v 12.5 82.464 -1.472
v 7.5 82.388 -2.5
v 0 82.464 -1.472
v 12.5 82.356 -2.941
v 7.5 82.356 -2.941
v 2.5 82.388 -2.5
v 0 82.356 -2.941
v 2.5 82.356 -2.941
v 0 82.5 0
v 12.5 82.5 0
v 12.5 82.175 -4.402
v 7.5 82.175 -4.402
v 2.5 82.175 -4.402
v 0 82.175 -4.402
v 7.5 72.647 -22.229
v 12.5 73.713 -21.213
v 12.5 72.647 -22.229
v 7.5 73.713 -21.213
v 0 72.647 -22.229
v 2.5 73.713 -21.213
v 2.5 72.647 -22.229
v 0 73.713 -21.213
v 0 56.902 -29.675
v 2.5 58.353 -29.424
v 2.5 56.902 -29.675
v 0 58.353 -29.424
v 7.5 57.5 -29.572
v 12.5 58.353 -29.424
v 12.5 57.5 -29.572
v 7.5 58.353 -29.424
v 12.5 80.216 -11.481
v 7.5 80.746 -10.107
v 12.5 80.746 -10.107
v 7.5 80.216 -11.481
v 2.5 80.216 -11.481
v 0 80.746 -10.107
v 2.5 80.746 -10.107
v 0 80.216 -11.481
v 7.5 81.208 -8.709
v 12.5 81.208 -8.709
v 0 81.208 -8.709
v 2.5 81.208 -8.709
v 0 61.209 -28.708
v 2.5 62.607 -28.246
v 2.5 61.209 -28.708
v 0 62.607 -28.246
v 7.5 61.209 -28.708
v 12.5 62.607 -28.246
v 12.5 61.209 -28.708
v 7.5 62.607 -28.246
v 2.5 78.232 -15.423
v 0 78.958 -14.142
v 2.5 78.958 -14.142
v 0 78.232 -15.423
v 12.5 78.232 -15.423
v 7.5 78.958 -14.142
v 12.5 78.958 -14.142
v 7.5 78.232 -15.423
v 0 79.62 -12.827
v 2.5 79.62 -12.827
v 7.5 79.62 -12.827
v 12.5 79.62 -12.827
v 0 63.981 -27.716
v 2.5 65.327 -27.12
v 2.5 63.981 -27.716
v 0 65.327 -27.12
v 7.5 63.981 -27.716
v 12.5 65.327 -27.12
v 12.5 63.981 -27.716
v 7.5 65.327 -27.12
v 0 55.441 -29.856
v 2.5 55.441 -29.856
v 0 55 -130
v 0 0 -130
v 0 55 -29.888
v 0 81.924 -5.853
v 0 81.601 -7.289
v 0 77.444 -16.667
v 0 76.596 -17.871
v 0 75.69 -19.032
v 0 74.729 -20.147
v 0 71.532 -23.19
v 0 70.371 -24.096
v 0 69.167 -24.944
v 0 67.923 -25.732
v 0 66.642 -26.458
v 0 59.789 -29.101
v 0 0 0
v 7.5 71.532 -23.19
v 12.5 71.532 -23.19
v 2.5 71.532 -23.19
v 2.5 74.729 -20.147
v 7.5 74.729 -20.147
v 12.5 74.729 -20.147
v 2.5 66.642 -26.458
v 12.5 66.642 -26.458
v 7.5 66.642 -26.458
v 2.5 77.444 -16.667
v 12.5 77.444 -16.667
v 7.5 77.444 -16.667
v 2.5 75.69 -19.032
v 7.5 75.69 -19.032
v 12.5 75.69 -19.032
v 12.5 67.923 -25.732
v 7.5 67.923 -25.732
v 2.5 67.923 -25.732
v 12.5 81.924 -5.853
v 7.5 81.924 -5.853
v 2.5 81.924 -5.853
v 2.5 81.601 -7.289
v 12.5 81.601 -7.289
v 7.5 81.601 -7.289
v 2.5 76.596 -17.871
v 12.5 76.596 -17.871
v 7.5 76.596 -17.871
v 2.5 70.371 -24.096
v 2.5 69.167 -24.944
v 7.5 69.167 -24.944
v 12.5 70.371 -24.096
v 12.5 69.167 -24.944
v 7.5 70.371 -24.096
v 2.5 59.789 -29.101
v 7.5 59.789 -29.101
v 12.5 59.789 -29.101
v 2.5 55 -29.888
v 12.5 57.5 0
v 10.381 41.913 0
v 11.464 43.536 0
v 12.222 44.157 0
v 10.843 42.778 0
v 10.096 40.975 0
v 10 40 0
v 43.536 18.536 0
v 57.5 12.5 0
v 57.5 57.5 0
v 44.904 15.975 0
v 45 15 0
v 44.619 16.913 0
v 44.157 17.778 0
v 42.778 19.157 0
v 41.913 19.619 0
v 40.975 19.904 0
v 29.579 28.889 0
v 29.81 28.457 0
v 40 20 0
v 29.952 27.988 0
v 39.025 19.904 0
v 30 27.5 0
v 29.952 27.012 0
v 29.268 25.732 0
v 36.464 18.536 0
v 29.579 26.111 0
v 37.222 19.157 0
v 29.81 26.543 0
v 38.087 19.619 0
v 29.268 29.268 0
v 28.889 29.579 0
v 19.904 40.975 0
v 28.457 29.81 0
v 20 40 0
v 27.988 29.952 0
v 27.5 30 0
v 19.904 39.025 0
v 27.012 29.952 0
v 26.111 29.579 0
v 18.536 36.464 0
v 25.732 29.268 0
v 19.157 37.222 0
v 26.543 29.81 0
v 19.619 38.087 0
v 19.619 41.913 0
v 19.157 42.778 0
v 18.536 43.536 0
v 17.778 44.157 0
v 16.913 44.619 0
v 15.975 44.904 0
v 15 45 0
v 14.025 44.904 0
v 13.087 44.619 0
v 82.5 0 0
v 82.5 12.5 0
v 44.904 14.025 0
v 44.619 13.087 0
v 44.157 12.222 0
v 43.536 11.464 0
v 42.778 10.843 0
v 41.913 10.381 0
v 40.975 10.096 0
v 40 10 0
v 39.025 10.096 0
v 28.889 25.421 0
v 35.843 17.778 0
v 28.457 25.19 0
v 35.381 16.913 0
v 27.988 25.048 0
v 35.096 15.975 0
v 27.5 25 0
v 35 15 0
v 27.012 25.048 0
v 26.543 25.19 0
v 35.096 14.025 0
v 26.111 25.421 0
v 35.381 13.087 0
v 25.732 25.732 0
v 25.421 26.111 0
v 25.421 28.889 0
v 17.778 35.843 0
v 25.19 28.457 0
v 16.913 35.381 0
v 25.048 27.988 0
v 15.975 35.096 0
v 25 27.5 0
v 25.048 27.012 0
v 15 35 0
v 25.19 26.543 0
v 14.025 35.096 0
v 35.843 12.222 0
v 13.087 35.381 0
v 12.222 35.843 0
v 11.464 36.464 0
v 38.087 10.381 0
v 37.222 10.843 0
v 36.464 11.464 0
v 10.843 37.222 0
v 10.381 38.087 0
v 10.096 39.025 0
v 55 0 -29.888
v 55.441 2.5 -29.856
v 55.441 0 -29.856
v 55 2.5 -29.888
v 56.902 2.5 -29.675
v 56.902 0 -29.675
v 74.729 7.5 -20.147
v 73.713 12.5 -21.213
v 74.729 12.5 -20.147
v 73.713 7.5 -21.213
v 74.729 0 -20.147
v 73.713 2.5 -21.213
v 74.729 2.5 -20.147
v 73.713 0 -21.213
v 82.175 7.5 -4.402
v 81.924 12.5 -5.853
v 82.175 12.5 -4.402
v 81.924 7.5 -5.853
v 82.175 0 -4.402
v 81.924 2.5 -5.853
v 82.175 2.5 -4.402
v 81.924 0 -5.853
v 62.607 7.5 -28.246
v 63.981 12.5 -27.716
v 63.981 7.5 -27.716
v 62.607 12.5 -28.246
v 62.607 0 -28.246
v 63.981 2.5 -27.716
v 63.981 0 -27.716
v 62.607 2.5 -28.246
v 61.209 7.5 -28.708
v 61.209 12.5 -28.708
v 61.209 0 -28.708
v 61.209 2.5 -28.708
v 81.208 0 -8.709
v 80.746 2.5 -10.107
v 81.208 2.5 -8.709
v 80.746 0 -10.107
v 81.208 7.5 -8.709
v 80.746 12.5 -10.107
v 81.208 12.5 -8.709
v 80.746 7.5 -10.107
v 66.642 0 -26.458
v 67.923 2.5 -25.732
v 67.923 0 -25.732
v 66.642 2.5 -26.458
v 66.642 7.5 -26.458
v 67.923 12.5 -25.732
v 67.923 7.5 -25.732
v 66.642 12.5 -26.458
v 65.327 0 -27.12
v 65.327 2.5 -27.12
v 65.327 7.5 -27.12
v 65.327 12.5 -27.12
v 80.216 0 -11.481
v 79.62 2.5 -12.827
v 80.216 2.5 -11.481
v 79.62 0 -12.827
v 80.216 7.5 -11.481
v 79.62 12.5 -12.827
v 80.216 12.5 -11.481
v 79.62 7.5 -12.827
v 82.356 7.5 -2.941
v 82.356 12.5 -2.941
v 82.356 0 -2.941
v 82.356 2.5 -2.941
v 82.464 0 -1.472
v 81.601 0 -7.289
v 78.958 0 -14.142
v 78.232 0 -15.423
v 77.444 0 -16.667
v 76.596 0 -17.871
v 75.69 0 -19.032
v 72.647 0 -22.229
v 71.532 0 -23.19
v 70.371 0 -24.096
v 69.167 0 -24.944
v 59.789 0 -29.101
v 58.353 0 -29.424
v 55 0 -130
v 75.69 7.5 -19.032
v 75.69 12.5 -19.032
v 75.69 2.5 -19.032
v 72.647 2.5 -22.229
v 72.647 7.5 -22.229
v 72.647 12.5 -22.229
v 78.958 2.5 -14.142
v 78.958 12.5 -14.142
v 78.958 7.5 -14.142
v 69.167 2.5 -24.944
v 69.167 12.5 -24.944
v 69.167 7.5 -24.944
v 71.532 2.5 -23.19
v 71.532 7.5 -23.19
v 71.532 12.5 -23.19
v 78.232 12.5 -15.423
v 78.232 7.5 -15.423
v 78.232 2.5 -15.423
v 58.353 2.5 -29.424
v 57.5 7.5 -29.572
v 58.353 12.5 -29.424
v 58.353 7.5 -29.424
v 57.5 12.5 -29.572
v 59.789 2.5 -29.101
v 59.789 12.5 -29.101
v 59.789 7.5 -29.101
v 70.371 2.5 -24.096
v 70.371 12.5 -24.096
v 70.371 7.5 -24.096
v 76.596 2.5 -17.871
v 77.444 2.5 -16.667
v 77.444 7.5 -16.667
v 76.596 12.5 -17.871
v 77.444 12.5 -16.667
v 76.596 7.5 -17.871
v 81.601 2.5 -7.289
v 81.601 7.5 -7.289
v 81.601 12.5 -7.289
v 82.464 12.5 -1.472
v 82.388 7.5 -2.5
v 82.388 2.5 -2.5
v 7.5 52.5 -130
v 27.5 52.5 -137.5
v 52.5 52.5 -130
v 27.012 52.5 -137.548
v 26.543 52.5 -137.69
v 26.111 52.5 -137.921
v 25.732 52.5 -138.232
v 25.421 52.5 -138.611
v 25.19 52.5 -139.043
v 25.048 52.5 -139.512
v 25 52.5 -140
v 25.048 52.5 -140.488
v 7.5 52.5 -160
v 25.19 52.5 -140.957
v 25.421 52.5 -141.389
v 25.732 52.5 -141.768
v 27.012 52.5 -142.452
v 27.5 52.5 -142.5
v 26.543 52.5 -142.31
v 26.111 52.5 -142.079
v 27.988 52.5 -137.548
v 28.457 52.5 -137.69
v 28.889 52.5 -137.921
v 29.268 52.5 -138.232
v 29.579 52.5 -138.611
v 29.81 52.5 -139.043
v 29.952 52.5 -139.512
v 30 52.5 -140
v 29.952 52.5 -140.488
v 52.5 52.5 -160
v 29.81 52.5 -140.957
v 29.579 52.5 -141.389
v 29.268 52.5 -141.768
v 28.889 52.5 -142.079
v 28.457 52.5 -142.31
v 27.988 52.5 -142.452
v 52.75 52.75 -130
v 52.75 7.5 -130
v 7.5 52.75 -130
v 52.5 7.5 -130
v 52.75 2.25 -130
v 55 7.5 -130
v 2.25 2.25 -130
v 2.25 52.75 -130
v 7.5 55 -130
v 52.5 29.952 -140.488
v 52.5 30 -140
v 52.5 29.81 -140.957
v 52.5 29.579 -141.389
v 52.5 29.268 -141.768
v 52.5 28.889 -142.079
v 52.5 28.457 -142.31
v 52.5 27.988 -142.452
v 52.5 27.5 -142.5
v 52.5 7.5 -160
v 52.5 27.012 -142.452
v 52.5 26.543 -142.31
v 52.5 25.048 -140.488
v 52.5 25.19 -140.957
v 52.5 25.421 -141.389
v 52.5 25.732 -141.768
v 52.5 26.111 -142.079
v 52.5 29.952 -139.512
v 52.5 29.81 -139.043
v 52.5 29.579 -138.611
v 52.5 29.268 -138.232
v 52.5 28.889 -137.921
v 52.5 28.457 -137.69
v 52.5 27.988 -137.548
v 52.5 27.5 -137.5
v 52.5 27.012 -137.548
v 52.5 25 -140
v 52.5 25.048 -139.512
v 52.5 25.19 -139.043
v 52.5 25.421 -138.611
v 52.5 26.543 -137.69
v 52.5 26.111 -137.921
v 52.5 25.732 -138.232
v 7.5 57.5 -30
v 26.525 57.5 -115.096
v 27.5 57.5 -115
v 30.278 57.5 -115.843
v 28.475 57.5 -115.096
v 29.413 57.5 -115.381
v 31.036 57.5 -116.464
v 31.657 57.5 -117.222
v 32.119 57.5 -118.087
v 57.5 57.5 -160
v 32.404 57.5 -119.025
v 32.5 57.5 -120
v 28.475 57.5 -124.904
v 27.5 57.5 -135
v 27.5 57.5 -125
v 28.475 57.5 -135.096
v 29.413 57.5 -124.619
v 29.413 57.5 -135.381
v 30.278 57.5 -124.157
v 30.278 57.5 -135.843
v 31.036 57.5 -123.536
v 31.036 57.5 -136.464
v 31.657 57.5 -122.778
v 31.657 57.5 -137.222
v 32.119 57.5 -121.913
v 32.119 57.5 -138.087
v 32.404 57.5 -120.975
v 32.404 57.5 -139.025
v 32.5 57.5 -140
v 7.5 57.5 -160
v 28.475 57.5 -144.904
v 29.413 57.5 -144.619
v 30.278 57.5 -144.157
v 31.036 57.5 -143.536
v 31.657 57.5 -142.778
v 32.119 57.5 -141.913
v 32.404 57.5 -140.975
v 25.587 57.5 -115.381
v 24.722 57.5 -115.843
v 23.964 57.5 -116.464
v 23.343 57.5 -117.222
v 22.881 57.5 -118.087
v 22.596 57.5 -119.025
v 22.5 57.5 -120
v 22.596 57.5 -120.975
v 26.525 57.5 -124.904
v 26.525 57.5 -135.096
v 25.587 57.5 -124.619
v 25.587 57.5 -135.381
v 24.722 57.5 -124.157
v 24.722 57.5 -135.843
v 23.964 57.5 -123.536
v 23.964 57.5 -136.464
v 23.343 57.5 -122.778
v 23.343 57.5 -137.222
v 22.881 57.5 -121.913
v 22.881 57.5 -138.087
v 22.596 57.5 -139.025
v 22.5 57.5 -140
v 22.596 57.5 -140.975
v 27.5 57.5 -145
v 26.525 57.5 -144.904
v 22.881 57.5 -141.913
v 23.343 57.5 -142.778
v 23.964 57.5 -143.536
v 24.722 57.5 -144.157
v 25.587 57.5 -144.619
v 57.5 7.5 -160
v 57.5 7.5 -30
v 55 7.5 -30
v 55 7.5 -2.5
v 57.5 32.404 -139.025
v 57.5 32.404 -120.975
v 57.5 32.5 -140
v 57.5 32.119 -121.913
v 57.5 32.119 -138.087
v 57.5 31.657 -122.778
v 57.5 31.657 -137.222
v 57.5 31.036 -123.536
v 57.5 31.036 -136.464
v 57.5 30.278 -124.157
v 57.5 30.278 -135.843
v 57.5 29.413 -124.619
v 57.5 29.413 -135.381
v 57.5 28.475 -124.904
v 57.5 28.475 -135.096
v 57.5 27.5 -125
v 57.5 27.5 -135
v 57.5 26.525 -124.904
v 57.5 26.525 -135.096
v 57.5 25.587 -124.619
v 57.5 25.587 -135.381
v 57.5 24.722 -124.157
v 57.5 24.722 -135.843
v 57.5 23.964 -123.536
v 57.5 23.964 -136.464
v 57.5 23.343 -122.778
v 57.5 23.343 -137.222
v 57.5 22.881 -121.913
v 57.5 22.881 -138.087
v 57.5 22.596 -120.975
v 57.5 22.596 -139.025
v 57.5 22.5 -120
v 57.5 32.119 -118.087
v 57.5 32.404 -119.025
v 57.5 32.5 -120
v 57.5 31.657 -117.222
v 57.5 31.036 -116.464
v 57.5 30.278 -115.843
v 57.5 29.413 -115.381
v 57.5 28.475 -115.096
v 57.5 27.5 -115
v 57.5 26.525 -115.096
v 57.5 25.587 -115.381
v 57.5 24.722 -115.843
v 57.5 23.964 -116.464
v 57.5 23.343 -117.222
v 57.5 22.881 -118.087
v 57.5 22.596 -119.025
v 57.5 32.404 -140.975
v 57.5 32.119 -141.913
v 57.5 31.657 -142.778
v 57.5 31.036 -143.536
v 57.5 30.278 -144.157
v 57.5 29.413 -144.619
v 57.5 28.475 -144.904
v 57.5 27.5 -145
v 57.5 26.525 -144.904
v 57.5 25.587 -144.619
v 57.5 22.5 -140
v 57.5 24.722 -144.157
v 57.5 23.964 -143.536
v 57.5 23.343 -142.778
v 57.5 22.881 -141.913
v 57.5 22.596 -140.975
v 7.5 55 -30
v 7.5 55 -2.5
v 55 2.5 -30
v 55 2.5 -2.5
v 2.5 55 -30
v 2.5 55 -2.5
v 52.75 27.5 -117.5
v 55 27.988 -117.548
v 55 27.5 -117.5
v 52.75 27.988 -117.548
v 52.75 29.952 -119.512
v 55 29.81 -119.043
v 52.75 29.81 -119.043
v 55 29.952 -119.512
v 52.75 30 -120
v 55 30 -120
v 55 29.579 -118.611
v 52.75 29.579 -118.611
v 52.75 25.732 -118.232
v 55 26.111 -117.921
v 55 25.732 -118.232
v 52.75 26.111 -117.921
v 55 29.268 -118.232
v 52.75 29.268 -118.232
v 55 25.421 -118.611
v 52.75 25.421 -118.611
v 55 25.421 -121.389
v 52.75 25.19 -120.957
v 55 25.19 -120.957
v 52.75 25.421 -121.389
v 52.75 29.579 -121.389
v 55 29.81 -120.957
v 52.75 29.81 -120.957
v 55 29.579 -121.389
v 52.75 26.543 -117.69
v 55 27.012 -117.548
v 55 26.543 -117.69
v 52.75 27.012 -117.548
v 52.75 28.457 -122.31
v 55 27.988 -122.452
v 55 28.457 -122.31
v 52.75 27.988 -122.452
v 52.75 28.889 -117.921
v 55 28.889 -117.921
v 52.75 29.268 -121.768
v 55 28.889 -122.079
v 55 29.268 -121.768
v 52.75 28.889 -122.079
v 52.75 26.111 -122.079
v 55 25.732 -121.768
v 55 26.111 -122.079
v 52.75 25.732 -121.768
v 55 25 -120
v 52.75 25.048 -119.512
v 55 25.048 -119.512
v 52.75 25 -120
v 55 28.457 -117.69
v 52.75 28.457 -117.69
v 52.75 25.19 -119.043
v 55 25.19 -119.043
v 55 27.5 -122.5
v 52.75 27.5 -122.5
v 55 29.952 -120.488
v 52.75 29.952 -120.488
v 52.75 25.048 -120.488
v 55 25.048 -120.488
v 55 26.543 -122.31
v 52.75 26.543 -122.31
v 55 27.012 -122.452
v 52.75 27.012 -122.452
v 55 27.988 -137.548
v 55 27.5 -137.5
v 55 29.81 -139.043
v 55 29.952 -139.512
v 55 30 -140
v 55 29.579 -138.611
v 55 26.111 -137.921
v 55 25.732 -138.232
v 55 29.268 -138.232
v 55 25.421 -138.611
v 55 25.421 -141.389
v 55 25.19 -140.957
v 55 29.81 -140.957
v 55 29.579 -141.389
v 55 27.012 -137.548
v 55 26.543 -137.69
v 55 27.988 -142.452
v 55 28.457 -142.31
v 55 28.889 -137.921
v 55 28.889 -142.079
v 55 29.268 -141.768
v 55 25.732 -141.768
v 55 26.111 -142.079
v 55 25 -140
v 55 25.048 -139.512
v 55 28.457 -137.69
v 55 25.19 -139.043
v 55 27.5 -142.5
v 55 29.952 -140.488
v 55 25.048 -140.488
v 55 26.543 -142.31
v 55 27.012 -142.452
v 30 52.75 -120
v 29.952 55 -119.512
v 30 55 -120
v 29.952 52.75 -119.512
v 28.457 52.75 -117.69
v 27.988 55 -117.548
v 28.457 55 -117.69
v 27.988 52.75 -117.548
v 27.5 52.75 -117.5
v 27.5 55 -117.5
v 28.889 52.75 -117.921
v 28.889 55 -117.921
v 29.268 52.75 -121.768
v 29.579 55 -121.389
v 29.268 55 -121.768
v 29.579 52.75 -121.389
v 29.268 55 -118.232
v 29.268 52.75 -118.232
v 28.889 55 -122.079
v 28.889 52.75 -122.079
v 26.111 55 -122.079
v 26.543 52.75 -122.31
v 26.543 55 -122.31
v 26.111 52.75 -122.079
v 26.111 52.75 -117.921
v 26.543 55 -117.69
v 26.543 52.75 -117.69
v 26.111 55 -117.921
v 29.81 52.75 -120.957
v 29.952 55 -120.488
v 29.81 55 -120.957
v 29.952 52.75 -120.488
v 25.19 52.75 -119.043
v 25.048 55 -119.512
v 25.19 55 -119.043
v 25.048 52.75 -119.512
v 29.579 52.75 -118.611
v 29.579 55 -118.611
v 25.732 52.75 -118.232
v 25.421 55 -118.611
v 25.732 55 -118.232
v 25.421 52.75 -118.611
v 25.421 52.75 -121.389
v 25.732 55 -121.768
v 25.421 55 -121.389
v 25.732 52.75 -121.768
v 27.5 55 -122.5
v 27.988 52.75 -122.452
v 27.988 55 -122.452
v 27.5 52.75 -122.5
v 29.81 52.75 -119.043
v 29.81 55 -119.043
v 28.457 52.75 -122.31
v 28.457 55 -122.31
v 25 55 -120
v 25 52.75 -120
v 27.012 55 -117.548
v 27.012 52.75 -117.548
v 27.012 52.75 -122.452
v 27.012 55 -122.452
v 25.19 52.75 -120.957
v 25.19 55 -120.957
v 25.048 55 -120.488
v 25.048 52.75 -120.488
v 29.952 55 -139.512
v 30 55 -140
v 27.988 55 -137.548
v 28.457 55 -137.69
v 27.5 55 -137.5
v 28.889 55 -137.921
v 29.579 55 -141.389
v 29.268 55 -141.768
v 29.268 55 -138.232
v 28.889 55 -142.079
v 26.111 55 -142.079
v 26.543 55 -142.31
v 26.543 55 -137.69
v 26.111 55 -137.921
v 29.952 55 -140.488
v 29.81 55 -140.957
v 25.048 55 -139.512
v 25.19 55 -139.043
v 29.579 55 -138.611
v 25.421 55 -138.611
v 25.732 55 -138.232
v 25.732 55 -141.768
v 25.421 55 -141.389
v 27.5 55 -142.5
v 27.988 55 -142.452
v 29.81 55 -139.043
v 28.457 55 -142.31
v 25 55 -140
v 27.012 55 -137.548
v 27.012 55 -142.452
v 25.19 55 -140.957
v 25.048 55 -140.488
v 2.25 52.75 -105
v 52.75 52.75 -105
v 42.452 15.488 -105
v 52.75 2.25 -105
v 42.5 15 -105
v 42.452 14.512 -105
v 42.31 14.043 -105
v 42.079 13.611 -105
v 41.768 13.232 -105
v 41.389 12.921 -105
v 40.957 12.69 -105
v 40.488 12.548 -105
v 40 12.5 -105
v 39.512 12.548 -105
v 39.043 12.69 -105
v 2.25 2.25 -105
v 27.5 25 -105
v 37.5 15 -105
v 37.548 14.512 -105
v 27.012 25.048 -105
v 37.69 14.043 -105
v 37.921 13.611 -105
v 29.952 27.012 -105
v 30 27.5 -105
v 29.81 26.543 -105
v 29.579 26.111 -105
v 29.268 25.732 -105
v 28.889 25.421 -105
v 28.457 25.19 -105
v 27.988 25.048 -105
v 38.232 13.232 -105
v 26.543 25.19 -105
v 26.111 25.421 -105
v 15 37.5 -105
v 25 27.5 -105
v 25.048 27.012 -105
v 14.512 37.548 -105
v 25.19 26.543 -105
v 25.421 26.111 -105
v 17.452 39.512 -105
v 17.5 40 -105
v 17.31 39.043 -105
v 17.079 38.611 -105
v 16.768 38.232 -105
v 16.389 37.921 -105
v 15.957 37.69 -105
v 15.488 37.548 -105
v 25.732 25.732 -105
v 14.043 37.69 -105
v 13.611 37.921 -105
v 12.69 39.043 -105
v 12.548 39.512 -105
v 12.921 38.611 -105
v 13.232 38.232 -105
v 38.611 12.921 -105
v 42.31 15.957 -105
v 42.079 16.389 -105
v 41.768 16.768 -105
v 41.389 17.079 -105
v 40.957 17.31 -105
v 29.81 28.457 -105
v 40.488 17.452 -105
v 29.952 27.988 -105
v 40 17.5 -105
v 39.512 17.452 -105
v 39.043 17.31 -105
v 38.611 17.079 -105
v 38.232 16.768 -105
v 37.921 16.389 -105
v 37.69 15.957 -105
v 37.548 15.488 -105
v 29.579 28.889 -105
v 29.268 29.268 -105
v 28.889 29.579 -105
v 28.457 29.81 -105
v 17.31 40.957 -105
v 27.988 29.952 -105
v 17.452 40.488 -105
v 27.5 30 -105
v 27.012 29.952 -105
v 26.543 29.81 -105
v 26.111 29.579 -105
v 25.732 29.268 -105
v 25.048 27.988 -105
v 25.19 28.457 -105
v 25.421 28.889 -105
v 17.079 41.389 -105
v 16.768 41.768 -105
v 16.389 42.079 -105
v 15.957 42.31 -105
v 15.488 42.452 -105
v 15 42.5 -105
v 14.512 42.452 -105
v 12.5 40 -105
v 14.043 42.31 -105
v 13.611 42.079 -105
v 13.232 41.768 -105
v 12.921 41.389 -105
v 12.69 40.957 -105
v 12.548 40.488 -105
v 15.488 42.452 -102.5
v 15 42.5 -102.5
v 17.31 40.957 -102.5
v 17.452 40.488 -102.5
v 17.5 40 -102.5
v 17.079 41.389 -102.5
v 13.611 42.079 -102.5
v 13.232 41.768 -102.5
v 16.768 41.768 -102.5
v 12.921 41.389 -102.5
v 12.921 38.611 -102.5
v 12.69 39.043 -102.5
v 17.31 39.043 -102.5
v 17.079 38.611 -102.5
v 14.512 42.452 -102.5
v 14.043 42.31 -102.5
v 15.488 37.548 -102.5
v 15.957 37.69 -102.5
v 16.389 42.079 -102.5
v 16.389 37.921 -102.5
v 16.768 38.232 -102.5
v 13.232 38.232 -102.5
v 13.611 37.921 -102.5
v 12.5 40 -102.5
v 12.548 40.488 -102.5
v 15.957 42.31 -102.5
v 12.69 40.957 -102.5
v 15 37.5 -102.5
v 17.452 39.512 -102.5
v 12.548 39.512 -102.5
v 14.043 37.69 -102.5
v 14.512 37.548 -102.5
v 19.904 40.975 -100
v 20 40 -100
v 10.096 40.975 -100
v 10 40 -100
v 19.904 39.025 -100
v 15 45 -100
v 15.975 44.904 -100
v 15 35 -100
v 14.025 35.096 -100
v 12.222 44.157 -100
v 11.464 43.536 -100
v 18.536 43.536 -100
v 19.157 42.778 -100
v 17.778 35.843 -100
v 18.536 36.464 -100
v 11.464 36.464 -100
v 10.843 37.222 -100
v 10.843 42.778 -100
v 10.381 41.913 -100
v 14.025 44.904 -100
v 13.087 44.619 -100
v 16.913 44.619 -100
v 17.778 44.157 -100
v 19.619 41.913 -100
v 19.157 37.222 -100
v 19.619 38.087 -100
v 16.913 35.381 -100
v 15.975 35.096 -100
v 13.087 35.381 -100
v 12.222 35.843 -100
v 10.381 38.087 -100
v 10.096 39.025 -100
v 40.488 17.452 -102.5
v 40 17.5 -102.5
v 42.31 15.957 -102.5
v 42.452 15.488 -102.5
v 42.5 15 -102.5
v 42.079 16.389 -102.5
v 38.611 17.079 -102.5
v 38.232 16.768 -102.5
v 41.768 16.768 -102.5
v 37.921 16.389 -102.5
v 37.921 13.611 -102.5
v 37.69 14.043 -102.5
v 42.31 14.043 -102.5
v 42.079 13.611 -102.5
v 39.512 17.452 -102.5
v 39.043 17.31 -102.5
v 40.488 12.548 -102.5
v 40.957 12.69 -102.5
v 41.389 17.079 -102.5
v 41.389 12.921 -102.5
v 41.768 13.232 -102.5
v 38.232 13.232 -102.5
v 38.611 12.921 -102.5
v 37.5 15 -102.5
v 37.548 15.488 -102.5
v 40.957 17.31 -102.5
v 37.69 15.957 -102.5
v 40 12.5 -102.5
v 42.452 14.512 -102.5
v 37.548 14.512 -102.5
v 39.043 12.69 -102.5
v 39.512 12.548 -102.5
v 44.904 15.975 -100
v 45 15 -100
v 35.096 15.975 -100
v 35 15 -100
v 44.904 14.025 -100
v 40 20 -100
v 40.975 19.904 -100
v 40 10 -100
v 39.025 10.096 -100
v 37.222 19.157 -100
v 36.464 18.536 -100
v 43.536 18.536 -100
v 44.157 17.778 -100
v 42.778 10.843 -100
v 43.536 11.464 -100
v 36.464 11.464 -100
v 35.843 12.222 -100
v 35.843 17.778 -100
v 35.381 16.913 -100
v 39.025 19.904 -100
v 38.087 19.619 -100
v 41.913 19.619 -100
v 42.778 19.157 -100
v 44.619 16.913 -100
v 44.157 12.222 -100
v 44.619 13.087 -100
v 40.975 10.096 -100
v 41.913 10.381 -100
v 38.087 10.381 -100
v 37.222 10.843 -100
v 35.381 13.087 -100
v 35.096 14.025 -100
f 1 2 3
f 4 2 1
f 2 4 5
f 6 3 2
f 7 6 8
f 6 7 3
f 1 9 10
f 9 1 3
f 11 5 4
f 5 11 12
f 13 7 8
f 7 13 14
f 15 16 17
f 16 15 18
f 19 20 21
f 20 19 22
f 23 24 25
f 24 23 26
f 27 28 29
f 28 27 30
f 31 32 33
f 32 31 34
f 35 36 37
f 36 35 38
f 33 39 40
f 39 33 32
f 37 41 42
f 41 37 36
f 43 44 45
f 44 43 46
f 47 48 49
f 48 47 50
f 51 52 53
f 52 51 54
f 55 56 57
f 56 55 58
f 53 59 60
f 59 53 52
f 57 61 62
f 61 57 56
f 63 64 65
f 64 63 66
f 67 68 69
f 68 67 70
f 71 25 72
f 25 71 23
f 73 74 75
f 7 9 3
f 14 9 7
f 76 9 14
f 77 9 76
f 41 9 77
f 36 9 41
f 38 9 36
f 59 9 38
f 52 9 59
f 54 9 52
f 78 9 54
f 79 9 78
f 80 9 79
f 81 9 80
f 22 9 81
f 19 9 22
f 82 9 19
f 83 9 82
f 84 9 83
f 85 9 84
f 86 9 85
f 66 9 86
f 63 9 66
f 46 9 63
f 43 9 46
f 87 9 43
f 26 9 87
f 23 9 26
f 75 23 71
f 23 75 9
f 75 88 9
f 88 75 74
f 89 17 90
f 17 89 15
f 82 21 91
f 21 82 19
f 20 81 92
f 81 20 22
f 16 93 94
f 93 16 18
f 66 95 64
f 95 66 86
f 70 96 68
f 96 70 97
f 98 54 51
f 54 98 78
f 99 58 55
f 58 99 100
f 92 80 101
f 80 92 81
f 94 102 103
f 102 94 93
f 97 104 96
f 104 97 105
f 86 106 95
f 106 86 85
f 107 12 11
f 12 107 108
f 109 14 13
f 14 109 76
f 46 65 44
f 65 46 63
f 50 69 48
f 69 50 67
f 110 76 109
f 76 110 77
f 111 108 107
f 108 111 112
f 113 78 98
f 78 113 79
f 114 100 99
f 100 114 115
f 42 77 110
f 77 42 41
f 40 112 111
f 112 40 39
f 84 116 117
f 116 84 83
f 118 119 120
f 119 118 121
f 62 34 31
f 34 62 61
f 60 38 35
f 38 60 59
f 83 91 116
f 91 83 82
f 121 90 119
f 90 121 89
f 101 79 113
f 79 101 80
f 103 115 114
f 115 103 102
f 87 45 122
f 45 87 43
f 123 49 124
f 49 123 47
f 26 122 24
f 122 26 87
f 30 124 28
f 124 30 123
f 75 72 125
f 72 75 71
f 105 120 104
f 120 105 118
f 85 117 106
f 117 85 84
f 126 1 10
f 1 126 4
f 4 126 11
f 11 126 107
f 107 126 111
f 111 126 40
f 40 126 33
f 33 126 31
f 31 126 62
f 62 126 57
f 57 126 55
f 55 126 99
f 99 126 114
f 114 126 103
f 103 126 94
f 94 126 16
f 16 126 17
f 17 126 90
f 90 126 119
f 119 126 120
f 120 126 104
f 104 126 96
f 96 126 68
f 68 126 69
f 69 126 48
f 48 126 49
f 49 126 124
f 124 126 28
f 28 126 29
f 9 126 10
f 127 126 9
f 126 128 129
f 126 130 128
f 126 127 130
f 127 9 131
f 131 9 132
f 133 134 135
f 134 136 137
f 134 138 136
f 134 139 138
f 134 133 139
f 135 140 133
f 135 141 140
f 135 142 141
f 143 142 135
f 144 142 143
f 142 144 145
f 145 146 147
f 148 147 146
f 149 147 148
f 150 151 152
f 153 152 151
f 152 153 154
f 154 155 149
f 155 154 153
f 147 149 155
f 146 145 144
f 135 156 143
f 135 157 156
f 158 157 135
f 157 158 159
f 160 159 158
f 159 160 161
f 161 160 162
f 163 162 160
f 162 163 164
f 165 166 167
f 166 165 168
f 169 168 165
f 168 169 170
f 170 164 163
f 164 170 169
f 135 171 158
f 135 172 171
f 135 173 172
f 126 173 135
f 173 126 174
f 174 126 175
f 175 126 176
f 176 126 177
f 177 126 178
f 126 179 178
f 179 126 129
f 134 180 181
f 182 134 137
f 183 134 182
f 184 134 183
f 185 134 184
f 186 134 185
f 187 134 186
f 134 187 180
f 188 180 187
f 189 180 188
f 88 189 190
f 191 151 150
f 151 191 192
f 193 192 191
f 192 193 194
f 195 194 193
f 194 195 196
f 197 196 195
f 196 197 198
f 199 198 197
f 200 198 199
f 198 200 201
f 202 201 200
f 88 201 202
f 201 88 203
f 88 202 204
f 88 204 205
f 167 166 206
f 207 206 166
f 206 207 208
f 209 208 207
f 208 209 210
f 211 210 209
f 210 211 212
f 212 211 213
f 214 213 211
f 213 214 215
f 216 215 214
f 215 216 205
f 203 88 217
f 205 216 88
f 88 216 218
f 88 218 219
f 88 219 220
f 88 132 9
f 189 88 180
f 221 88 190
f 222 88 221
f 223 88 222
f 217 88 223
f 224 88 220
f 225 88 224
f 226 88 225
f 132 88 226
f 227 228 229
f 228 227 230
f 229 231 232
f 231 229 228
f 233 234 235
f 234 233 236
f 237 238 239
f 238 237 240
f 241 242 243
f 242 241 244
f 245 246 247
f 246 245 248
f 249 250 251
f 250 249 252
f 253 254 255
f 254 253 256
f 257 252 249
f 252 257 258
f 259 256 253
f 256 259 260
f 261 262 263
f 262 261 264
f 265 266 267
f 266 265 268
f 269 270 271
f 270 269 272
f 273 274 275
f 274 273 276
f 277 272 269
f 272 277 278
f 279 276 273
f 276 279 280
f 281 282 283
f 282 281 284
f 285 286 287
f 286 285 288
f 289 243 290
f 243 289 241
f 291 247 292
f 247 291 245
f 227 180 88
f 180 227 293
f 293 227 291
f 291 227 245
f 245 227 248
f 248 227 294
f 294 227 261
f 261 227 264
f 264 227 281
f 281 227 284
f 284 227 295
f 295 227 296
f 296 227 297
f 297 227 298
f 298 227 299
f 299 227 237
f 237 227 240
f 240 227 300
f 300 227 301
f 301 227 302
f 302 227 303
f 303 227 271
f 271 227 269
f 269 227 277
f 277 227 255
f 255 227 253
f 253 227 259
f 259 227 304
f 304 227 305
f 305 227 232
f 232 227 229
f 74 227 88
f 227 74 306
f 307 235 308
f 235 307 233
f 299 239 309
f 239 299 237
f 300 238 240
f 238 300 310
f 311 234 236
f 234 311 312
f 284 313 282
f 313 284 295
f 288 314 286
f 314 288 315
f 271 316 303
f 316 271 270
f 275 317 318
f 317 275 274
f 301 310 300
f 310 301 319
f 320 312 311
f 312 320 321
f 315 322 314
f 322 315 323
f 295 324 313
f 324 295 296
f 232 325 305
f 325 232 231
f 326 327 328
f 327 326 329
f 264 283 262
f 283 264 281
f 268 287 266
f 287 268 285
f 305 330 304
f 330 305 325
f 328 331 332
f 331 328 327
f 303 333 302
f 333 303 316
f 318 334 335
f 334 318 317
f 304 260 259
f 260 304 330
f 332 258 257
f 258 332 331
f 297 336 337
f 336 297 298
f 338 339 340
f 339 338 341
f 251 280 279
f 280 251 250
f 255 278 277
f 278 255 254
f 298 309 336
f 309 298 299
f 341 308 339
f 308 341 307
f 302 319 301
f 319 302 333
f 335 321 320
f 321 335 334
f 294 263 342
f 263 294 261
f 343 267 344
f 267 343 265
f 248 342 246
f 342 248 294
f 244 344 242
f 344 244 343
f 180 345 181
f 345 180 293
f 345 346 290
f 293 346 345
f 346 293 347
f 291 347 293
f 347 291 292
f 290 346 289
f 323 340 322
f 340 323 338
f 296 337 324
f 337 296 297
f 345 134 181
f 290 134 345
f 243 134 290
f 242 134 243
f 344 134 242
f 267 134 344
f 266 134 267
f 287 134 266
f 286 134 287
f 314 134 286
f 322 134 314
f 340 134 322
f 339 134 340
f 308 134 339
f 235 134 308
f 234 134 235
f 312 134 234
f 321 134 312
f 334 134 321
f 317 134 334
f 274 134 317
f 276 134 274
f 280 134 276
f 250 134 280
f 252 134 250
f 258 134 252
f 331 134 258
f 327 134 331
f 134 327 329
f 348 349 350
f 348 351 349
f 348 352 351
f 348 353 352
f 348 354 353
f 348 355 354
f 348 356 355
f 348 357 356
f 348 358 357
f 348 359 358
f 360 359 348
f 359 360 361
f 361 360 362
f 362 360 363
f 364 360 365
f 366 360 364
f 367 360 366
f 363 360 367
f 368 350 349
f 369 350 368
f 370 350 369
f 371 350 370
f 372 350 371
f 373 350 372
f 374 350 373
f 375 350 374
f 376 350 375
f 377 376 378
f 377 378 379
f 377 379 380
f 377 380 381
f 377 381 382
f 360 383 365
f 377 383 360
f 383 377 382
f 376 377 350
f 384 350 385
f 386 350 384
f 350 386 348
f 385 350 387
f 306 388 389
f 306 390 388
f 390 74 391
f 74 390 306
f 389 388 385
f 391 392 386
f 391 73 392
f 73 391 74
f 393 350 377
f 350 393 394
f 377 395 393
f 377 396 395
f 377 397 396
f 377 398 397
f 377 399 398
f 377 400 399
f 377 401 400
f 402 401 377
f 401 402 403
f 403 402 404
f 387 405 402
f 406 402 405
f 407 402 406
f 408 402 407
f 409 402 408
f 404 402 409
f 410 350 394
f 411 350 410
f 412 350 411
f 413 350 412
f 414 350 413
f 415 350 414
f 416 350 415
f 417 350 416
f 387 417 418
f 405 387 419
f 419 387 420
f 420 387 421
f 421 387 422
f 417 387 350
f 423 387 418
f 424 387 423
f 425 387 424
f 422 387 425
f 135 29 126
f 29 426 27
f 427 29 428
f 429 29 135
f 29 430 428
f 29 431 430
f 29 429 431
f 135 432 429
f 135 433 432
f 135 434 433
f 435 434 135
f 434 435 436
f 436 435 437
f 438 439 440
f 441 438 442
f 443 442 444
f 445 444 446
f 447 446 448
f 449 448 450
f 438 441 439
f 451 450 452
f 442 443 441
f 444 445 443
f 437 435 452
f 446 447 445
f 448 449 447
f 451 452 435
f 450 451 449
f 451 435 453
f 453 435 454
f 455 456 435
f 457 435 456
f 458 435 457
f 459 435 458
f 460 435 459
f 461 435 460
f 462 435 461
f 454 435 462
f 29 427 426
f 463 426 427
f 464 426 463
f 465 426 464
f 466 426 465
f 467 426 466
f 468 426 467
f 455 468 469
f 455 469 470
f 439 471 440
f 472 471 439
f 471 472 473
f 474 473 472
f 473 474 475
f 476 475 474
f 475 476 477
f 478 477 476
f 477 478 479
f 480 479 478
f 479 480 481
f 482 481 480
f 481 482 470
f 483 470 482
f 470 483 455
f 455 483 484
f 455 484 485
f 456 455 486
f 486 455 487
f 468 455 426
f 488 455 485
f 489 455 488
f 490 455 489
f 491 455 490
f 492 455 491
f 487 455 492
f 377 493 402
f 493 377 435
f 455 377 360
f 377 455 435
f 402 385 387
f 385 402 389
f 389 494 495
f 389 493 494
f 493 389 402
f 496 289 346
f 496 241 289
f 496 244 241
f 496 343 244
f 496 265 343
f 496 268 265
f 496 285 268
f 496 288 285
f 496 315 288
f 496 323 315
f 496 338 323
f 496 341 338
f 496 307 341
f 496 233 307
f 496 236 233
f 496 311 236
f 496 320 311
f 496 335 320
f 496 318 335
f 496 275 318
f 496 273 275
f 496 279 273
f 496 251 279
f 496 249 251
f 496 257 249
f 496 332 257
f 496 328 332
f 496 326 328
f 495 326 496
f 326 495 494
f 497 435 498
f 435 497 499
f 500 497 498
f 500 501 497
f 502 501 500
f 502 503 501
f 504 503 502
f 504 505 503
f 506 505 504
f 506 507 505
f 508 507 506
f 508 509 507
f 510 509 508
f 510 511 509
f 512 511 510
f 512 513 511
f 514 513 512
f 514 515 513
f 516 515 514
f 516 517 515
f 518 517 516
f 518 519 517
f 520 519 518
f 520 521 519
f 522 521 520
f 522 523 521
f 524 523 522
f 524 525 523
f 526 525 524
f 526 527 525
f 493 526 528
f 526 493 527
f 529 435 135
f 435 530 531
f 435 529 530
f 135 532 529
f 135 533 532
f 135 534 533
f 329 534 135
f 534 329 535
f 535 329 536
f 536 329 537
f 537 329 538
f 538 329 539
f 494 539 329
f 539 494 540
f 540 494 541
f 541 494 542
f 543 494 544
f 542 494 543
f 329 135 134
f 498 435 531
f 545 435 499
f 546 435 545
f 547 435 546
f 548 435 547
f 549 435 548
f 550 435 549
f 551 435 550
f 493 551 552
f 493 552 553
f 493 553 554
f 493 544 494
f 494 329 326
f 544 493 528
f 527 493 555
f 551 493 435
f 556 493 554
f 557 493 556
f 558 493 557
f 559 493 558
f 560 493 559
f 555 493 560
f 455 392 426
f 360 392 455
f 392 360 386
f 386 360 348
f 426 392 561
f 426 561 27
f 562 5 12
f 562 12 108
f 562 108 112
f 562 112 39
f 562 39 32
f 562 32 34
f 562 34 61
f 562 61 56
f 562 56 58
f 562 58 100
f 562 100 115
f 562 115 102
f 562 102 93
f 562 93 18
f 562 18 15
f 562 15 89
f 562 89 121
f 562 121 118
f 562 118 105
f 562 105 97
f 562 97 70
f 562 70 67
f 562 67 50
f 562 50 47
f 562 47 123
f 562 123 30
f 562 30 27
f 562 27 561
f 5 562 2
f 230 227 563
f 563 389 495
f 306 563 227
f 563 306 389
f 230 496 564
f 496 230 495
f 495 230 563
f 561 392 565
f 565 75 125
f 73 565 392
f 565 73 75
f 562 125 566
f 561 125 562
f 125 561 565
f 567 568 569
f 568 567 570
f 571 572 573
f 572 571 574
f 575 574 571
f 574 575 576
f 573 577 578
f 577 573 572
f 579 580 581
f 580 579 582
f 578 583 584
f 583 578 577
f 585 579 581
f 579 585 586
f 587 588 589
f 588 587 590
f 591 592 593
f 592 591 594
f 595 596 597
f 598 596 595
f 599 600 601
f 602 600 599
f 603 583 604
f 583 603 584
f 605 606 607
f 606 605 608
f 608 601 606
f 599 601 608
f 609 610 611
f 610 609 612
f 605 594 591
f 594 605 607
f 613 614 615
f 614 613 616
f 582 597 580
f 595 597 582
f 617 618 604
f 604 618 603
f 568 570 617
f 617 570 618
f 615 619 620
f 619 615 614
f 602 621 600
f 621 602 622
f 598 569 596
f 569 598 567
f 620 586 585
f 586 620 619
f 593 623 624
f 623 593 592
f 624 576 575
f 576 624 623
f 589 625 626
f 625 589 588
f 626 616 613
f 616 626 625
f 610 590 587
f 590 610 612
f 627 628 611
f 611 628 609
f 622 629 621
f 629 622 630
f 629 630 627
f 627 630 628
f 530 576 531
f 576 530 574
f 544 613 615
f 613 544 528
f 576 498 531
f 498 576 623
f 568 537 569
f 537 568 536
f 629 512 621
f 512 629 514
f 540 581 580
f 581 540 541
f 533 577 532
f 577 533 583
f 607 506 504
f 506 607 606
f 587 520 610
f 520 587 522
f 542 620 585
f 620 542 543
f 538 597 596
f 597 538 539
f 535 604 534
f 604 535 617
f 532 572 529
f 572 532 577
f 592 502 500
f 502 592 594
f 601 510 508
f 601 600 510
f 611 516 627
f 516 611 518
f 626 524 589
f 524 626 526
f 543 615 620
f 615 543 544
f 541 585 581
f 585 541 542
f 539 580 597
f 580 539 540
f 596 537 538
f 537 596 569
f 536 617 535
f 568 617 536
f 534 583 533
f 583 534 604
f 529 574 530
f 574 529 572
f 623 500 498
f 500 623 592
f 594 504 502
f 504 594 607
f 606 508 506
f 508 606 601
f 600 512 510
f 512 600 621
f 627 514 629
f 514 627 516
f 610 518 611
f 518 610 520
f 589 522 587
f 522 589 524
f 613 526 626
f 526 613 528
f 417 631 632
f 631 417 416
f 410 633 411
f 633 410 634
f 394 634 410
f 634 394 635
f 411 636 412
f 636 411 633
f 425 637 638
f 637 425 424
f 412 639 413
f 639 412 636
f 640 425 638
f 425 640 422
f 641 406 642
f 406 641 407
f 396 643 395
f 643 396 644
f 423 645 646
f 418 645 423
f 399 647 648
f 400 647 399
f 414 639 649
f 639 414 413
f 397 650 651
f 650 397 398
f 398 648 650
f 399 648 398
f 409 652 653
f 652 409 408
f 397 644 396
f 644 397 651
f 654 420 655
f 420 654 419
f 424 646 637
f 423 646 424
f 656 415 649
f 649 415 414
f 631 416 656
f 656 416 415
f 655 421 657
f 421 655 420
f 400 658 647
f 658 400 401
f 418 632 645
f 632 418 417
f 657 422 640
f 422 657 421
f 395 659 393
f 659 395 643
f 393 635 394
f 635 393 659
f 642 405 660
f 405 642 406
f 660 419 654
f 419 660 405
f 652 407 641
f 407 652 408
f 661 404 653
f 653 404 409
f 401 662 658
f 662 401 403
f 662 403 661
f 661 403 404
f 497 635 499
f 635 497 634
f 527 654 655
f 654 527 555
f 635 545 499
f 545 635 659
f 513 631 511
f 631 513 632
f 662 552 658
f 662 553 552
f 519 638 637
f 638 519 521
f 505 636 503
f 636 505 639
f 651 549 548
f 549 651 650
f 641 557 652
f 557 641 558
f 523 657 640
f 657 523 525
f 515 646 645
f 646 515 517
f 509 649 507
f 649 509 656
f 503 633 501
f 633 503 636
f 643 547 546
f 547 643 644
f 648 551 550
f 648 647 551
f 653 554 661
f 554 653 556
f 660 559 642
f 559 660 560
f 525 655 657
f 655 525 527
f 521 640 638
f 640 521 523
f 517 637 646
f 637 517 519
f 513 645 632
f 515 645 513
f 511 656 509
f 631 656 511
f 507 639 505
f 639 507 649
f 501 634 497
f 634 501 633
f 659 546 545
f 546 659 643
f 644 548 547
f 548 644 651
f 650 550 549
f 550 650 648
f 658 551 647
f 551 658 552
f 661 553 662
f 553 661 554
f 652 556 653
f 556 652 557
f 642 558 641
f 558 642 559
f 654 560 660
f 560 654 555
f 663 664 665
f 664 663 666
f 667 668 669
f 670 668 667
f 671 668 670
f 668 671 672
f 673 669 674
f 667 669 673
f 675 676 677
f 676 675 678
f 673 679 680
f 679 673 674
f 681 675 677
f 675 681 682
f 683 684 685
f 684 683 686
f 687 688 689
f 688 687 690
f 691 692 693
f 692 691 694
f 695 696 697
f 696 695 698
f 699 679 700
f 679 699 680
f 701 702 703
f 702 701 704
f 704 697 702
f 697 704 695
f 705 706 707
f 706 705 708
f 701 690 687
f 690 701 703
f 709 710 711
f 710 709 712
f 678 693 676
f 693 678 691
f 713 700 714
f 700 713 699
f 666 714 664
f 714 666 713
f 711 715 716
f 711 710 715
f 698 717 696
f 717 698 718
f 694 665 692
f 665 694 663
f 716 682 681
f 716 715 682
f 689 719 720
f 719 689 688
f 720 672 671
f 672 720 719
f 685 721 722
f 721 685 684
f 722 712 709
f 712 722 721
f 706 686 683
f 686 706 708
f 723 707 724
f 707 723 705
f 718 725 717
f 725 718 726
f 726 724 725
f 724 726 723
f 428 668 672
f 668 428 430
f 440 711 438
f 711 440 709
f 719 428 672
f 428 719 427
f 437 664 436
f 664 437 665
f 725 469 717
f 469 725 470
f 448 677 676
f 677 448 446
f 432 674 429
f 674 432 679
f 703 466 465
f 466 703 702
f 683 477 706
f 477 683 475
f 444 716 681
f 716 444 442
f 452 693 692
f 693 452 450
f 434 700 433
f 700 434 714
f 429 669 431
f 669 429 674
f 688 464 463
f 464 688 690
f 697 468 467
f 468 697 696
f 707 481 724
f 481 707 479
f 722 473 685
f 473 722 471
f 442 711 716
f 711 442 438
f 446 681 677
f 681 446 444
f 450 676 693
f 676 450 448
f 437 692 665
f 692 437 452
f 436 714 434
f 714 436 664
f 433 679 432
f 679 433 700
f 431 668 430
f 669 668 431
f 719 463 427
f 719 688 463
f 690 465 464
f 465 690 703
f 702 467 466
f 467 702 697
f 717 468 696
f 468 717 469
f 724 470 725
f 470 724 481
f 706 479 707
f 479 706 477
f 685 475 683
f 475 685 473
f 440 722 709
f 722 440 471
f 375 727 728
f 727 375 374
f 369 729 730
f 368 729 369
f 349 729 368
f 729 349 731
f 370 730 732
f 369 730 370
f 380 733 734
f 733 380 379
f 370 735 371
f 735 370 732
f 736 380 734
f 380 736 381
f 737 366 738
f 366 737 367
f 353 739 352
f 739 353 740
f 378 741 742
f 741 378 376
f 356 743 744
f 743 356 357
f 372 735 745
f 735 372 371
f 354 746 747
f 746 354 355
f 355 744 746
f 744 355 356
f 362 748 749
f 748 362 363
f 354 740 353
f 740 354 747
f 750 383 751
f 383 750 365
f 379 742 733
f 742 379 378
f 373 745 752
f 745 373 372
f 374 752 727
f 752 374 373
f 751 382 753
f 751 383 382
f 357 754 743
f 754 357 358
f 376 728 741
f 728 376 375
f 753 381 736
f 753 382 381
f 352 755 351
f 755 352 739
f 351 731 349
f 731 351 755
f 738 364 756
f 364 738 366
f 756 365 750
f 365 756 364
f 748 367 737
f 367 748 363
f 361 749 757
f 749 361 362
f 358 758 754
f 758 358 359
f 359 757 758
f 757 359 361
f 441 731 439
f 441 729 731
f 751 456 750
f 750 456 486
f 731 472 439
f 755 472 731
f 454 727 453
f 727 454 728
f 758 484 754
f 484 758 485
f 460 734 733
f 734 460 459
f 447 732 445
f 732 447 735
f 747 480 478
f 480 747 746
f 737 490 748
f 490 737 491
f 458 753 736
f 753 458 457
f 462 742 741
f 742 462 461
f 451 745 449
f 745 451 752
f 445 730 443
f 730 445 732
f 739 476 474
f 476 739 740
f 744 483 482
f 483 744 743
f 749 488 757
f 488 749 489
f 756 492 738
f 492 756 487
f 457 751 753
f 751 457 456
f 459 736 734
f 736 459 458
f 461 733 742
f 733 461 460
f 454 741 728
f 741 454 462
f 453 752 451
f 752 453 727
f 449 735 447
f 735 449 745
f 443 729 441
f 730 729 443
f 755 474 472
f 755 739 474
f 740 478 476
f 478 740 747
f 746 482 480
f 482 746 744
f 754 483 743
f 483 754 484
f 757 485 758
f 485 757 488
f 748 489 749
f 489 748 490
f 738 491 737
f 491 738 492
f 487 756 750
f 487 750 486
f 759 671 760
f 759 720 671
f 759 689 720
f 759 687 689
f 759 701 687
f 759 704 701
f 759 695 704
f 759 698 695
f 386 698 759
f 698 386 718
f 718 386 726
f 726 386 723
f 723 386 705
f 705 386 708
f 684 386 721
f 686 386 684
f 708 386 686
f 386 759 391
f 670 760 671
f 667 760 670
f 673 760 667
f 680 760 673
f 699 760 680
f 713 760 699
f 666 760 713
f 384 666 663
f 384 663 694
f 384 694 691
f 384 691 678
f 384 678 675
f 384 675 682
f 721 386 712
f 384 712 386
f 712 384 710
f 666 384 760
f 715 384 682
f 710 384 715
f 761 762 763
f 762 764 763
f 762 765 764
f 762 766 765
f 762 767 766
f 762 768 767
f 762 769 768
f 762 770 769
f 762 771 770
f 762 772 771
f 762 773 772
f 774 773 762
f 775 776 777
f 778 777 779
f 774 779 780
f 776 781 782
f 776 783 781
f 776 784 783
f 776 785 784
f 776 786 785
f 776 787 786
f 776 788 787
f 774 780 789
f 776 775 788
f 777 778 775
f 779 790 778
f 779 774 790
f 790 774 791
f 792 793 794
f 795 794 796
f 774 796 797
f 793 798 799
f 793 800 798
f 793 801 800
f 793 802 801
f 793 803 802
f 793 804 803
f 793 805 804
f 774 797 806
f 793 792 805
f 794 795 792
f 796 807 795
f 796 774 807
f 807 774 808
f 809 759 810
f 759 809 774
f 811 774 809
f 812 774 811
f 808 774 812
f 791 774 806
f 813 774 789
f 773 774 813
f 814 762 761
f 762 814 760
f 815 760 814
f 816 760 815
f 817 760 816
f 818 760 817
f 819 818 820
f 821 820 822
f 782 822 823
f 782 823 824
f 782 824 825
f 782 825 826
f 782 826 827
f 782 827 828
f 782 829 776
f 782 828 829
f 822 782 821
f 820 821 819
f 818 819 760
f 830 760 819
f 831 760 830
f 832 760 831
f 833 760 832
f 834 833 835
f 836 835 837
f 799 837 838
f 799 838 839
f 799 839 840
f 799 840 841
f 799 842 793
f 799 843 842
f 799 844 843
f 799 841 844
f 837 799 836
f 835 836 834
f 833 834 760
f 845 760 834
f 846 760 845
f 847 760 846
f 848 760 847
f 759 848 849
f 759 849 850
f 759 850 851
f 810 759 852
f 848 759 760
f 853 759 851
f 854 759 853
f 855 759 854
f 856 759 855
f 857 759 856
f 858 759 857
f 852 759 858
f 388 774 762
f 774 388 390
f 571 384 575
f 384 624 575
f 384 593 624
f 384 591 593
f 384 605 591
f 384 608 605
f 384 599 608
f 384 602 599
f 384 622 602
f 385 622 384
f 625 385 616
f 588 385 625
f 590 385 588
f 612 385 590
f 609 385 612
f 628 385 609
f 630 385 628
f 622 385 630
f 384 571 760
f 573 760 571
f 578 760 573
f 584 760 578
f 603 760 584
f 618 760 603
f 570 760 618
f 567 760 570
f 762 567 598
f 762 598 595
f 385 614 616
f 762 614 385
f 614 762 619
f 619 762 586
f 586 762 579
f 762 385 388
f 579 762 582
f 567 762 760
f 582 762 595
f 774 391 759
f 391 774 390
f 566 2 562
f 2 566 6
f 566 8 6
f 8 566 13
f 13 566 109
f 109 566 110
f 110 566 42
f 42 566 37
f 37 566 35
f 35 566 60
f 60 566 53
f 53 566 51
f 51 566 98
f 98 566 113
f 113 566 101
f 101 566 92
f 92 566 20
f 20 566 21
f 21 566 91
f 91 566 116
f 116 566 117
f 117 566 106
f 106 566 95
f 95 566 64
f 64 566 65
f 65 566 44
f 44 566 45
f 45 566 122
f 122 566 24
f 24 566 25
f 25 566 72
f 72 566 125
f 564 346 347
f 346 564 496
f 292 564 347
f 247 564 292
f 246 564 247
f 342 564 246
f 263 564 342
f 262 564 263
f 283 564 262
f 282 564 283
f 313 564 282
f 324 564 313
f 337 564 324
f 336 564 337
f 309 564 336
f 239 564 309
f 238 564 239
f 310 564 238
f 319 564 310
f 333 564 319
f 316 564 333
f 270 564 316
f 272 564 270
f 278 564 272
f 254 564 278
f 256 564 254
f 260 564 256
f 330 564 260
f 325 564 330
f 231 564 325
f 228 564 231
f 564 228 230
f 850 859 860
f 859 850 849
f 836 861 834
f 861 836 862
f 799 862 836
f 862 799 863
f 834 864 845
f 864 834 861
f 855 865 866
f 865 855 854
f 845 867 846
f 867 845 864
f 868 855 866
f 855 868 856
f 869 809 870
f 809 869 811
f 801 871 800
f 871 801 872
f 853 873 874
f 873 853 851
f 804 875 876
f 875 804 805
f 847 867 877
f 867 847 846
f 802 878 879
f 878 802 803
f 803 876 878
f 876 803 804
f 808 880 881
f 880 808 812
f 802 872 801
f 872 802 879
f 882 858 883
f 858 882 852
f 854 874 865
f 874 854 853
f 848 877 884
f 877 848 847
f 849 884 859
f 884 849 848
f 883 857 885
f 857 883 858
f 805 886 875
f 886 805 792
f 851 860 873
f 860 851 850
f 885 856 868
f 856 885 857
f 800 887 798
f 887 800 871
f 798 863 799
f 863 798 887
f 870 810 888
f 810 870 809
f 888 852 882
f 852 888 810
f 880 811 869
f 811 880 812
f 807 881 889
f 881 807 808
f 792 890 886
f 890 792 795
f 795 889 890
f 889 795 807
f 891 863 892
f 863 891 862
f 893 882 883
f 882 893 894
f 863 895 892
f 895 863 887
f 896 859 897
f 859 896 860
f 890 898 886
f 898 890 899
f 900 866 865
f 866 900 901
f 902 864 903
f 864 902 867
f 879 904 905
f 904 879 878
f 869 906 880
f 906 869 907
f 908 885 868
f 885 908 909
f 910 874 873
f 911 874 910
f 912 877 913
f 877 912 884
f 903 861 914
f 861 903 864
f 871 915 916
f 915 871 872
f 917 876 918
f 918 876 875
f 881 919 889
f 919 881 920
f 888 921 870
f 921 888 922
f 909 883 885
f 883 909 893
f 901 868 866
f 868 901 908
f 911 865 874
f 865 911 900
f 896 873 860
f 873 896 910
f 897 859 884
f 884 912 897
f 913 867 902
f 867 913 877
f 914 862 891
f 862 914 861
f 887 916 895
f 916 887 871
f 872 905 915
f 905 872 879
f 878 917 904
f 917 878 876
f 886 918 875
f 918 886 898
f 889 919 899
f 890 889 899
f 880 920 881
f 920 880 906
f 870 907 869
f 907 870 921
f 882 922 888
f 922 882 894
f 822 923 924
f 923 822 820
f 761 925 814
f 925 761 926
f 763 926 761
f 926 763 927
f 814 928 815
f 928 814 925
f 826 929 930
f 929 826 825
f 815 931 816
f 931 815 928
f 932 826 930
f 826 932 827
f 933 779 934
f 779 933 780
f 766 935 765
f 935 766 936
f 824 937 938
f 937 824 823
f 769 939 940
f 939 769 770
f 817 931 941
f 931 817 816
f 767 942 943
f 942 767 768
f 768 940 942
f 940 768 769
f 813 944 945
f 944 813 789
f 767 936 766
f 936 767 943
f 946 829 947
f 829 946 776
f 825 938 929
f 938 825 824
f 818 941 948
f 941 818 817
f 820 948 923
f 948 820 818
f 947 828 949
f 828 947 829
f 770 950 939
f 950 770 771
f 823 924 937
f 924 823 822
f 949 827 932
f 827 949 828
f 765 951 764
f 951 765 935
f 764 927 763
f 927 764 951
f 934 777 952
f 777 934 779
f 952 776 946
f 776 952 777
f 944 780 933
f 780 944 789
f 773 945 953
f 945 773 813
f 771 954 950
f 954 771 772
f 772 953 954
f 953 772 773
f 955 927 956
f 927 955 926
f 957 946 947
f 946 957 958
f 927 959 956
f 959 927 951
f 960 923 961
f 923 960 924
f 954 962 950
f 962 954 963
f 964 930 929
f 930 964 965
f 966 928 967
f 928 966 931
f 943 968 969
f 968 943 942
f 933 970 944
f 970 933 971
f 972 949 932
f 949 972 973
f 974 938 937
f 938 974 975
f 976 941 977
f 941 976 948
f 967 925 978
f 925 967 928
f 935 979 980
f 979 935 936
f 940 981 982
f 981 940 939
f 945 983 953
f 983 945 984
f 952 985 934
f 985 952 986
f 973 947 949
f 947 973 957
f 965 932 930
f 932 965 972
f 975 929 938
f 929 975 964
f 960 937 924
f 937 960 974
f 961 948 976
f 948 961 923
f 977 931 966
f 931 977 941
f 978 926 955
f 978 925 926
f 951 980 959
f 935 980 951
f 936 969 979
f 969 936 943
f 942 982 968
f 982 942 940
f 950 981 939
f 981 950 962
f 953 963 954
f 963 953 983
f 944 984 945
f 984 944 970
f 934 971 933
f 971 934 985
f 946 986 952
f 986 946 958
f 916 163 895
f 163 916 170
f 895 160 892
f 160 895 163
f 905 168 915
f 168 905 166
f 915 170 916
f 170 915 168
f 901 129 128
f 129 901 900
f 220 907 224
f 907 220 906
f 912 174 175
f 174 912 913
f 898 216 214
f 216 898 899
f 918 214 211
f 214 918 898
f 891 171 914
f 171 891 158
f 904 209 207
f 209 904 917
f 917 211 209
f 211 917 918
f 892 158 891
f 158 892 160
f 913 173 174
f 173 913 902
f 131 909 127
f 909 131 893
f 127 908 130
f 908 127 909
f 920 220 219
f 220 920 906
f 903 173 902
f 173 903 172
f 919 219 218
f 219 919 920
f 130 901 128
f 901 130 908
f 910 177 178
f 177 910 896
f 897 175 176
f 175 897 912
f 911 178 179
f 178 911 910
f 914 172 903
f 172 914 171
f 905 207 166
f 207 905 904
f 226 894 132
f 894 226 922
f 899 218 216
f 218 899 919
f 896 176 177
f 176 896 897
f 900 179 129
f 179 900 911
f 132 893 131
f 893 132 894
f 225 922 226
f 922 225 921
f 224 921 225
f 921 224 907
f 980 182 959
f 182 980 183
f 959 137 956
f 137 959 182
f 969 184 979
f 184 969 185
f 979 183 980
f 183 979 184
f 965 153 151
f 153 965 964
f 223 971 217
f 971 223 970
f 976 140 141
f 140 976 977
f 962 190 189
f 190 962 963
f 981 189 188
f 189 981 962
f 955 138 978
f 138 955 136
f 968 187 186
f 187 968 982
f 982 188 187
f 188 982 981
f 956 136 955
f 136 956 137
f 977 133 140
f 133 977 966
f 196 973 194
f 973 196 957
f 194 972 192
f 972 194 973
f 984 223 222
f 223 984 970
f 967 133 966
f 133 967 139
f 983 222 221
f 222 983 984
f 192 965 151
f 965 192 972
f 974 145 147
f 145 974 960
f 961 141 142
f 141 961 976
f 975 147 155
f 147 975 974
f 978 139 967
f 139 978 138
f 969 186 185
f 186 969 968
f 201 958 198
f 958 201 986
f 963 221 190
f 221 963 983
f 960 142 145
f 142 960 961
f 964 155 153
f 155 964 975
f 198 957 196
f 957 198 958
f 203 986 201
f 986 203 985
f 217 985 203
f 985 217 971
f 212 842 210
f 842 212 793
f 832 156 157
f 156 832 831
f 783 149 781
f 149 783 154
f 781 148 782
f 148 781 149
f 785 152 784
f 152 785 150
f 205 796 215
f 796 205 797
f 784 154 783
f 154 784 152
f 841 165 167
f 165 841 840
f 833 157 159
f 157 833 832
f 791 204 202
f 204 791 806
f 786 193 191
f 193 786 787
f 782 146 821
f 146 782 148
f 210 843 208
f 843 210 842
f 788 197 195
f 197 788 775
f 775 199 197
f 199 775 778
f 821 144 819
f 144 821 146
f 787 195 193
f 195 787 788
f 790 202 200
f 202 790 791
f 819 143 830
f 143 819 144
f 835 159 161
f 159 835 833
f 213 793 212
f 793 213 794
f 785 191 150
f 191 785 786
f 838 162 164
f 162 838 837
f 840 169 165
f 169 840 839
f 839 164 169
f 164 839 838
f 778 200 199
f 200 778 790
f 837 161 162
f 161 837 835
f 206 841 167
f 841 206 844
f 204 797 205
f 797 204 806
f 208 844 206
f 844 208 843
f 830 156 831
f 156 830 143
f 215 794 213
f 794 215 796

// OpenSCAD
module m5csk() {
    cylinder(d=5, h=5, $fn=32);
    cylinder(d2=10, d1=0, h=5, $fn=32);
}

module quarter_cylinder(r, h) {
    $fn=128;
    intersection() {
        cylinder(r=r, h=h);
        translate([0, 0, -0.05]) cube([r, r, h+0.1]);
    }
}

module base_outer() {
    difference() {
        union() {
            cube([52.5, 52.5, 130]);
            translate([52.5, 12.5, 0])
                rotate([90, 0, 0])
                quarter_cylinder(30, 12.5); 
            translate([12.5, 52.5, 0])
                rotate([0, -90, 0])
                quarter_cylinder(30, 12.5);
            translate([7.5, 52.5, 0])
                cube([57.5-7.5, 5, 160]);
            translate([52.5, 7.5, 0])
                cube([5, 57.5-7.5, 160]);
            translate([0, 52.5, 0])
                cube([7.5, 2.5, 130]);
            translate([52.5, 0, 0])
                cube([2.5, 7.5, 130]);
        }
        translate([2.25, 2.25, 105]) cube([50.5, 50.5, 25]);
        translate([55, 2.5, 2.5]) cube([27.5, 5, 27.5]);
        translate([2.5, 55, 2.5]) cube([5, 27.5, 27.5]);
        translate([27.5, 52.5, 120])
            rotate([-90, 0, 0])
            m5csk();
        translate([27.5, 52.5, 140])
            rotate([-90, 0, 0])
            m5csk();
        translate([52.5, 27.5, 120])
            rotate([0, 90, 0])
            m5csk();
        translate([52.5, 27.5, 140])
            rotate([0, 90, 0])
            m5csk();

    }
}

module outer_upper_top(){ 
    difference(){
        rotate([180, 0, 90]) base_outer();
        translate([15, 40, -105]) m5csk();
        translate([15, 40, 0]) rotate([180, 0, 0]) cylinder(d=10, h=100, $fn=32);
        translate([40, 15, -105]) m5csk();
        translate([40, 15, 0]) rotate([180, 0, 0]) cylinder(d=10, h=100, $fn=32);
        translate([27.5, 27.5, 0]) rotate([180, 0, 0]) cylinder(d=5, h=105, $fn=32);
    }
}

outer_upper_top();
